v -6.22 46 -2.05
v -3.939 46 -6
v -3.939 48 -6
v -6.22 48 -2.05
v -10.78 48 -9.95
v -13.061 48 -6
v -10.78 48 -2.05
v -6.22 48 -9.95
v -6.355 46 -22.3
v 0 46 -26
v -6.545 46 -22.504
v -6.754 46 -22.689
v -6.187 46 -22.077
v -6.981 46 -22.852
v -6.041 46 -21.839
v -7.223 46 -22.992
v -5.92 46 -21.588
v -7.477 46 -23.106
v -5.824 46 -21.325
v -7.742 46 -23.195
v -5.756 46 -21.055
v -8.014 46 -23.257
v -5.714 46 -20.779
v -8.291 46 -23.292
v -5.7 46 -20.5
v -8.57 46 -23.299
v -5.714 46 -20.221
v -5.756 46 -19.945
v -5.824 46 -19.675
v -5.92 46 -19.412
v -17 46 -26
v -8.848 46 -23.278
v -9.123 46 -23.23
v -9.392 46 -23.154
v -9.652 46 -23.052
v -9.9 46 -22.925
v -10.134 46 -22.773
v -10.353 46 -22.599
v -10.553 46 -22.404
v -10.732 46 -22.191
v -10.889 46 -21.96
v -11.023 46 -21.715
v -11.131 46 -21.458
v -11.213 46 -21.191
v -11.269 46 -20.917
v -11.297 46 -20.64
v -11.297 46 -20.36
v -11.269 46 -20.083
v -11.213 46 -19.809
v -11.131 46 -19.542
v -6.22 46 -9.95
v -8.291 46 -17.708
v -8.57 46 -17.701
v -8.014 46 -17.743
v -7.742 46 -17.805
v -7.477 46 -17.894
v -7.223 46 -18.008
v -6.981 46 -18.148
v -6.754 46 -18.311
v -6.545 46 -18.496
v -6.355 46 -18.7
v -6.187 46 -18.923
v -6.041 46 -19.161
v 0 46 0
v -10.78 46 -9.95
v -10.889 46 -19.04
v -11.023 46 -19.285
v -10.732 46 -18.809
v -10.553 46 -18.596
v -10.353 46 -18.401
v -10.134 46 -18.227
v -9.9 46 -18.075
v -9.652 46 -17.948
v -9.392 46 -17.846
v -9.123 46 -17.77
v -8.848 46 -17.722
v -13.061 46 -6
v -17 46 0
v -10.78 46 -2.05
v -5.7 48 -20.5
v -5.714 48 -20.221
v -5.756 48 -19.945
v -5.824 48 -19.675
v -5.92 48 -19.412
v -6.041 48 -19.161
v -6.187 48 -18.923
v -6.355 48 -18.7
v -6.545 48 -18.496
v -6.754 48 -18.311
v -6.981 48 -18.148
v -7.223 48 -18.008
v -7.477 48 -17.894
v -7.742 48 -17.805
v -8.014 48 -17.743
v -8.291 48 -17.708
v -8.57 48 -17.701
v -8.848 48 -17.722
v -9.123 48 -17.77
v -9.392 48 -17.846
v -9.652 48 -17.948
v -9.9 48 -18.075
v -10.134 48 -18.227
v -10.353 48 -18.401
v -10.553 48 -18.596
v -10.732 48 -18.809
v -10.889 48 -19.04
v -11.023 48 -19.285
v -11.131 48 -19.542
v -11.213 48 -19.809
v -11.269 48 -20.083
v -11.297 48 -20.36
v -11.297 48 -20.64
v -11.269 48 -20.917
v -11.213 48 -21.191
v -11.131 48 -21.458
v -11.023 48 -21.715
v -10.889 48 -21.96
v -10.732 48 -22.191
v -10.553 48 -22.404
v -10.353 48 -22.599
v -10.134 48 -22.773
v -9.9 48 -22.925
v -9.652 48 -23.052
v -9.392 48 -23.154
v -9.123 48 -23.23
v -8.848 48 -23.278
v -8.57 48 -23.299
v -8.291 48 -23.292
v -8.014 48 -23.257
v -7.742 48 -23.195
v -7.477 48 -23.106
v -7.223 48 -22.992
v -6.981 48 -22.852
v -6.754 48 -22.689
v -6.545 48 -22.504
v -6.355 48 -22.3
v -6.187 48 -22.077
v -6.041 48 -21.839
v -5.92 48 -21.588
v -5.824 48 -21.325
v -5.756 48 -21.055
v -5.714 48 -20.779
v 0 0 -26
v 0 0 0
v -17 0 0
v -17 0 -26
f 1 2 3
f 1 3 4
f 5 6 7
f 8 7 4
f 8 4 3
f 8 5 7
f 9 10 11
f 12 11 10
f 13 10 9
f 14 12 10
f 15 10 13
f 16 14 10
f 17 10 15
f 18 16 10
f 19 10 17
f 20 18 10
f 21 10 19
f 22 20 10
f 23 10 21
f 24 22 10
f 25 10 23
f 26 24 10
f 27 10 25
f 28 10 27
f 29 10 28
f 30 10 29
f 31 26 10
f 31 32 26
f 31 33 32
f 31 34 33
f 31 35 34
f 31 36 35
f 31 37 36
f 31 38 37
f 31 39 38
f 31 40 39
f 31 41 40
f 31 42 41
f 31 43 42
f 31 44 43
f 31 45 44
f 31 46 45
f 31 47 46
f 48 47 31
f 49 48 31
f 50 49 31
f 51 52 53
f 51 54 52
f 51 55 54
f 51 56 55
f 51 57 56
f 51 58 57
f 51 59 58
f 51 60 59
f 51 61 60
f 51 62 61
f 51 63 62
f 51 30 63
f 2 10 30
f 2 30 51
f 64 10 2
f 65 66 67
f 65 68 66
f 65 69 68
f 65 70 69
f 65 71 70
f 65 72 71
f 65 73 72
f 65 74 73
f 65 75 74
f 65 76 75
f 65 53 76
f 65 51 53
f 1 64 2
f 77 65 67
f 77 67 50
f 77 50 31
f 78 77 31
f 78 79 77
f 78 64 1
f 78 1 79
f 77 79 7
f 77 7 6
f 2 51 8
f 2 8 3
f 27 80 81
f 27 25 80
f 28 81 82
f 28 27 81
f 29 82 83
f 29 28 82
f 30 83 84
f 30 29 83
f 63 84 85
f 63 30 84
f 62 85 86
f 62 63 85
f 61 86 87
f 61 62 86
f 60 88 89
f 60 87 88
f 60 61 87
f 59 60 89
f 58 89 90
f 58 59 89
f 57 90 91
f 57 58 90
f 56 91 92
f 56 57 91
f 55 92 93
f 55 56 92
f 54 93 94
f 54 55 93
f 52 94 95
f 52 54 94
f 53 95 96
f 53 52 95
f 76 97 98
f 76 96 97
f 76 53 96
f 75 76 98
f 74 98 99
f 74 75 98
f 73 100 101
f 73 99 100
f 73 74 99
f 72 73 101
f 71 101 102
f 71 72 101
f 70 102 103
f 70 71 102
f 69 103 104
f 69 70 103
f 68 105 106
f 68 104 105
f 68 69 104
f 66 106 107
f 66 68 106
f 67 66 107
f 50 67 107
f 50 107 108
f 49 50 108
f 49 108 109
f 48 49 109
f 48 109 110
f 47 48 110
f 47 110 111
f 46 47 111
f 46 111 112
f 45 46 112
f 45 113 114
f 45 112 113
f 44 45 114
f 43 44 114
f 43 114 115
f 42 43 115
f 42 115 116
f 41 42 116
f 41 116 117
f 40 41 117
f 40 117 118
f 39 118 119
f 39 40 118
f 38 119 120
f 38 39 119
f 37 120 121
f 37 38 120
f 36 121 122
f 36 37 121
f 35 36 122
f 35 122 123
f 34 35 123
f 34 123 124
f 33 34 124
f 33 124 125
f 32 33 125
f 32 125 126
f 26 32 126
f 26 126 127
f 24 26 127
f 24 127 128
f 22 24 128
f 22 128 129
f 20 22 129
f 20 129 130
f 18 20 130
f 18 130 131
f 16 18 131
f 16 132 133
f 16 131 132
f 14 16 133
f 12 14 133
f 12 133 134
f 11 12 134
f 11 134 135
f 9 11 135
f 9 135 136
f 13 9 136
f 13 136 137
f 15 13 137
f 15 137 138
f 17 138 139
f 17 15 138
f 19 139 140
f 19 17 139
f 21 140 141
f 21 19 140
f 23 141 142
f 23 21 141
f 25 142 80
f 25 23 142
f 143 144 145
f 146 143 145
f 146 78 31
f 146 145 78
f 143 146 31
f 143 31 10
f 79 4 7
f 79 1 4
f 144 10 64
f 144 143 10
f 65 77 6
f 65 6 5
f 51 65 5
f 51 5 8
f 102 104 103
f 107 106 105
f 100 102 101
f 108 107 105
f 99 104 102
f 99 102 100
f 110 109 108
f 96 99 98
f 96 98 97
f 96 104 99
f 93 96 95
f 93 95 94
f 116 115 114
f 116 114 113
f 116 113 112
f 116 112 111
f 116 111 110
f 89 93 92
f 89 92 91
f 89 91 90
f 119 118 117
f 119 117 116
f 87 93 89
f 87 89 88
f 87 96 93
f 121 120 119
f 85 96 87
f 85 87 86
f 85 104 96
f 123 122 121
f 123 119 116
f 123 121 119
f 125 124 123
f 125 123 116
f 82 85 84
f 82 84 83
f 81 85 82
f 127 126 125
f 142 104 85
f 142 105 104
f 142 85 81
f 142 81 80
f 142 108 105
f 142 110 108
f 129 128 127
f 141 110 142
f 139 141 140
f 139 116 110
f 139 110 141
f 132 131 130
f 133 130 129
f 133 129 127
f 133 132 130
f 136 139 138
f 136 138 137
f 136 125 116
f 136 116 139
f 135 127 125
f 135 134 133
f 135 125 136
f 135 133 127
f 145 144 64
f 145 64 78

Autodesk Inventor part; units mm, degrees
ref_plane "YZ Plane" through (0, 0, 0) normal (1, 0, 0) x (0, 1, 0)
ref_plane "XZ Plane" through (0, 0, 0) normal (0, 1, 0) x (-1, 0, 0)
ref_plane "XY Plane" through (0, 0, 0) normal (0, 0, 1) x (1, 0, 0)
sketch "Sketch1" plane through (0, 0, 0) normal (0, 1, 0) x (-1, 0, 0)
  line L0 (0, 0) -> (17, 0)
  line L1 (17, 0) -> (17, -26)
  line L2 (17, -26) -> (0, -26)
  line L3 (0, -26) -> (0, 0)
  dimension "d0" = 26
  dimension "d1" = 17
extrude "Extrusion1" add sketch "Sketch1" along normal blind 46
sketch "Sketch2" plane through (0, 46, 0) normal (0, 1, 0) x (1, 0, 0)
  line L0 (-17, 0) -> (0, 0) construction
  line L1 (-8.5, 0) -> (-8.5, 26) construction
  line L2 (0, 26) -> (-17, 26) construction
  circle A0 centre (-8.5, 20.5) radius 2.8
  line L3 (-3.9389, 6) -> (-6.2195, 2.05)
  line L4 (-6.2195, 2.05) -> (-10.7805, 2.05)
  line L5 (-10.7805, 2.05) -> (-13.0611, 6)
  line L6 (-13.0611, 6) -> (-10.7805, 9.95)
  line L7 (-10.7805, 9.95) -> (-6.2195, 9.95)
  line L8 (-6.2195, 9.95) -> (-3.9389, 6)
  point P0 (-8.5, 6)
  dimension "d5" = 7.9
  dimension "d6" = 6
  dimension "d7" = 5.5
  dimension "d8" = 5.6
extrude "Extrusion2" add sketch "Sketch2" along normal blind 2
equation "\"d2\" = height"
equation "\"height\" = 46"
properties part number "bat9V"
